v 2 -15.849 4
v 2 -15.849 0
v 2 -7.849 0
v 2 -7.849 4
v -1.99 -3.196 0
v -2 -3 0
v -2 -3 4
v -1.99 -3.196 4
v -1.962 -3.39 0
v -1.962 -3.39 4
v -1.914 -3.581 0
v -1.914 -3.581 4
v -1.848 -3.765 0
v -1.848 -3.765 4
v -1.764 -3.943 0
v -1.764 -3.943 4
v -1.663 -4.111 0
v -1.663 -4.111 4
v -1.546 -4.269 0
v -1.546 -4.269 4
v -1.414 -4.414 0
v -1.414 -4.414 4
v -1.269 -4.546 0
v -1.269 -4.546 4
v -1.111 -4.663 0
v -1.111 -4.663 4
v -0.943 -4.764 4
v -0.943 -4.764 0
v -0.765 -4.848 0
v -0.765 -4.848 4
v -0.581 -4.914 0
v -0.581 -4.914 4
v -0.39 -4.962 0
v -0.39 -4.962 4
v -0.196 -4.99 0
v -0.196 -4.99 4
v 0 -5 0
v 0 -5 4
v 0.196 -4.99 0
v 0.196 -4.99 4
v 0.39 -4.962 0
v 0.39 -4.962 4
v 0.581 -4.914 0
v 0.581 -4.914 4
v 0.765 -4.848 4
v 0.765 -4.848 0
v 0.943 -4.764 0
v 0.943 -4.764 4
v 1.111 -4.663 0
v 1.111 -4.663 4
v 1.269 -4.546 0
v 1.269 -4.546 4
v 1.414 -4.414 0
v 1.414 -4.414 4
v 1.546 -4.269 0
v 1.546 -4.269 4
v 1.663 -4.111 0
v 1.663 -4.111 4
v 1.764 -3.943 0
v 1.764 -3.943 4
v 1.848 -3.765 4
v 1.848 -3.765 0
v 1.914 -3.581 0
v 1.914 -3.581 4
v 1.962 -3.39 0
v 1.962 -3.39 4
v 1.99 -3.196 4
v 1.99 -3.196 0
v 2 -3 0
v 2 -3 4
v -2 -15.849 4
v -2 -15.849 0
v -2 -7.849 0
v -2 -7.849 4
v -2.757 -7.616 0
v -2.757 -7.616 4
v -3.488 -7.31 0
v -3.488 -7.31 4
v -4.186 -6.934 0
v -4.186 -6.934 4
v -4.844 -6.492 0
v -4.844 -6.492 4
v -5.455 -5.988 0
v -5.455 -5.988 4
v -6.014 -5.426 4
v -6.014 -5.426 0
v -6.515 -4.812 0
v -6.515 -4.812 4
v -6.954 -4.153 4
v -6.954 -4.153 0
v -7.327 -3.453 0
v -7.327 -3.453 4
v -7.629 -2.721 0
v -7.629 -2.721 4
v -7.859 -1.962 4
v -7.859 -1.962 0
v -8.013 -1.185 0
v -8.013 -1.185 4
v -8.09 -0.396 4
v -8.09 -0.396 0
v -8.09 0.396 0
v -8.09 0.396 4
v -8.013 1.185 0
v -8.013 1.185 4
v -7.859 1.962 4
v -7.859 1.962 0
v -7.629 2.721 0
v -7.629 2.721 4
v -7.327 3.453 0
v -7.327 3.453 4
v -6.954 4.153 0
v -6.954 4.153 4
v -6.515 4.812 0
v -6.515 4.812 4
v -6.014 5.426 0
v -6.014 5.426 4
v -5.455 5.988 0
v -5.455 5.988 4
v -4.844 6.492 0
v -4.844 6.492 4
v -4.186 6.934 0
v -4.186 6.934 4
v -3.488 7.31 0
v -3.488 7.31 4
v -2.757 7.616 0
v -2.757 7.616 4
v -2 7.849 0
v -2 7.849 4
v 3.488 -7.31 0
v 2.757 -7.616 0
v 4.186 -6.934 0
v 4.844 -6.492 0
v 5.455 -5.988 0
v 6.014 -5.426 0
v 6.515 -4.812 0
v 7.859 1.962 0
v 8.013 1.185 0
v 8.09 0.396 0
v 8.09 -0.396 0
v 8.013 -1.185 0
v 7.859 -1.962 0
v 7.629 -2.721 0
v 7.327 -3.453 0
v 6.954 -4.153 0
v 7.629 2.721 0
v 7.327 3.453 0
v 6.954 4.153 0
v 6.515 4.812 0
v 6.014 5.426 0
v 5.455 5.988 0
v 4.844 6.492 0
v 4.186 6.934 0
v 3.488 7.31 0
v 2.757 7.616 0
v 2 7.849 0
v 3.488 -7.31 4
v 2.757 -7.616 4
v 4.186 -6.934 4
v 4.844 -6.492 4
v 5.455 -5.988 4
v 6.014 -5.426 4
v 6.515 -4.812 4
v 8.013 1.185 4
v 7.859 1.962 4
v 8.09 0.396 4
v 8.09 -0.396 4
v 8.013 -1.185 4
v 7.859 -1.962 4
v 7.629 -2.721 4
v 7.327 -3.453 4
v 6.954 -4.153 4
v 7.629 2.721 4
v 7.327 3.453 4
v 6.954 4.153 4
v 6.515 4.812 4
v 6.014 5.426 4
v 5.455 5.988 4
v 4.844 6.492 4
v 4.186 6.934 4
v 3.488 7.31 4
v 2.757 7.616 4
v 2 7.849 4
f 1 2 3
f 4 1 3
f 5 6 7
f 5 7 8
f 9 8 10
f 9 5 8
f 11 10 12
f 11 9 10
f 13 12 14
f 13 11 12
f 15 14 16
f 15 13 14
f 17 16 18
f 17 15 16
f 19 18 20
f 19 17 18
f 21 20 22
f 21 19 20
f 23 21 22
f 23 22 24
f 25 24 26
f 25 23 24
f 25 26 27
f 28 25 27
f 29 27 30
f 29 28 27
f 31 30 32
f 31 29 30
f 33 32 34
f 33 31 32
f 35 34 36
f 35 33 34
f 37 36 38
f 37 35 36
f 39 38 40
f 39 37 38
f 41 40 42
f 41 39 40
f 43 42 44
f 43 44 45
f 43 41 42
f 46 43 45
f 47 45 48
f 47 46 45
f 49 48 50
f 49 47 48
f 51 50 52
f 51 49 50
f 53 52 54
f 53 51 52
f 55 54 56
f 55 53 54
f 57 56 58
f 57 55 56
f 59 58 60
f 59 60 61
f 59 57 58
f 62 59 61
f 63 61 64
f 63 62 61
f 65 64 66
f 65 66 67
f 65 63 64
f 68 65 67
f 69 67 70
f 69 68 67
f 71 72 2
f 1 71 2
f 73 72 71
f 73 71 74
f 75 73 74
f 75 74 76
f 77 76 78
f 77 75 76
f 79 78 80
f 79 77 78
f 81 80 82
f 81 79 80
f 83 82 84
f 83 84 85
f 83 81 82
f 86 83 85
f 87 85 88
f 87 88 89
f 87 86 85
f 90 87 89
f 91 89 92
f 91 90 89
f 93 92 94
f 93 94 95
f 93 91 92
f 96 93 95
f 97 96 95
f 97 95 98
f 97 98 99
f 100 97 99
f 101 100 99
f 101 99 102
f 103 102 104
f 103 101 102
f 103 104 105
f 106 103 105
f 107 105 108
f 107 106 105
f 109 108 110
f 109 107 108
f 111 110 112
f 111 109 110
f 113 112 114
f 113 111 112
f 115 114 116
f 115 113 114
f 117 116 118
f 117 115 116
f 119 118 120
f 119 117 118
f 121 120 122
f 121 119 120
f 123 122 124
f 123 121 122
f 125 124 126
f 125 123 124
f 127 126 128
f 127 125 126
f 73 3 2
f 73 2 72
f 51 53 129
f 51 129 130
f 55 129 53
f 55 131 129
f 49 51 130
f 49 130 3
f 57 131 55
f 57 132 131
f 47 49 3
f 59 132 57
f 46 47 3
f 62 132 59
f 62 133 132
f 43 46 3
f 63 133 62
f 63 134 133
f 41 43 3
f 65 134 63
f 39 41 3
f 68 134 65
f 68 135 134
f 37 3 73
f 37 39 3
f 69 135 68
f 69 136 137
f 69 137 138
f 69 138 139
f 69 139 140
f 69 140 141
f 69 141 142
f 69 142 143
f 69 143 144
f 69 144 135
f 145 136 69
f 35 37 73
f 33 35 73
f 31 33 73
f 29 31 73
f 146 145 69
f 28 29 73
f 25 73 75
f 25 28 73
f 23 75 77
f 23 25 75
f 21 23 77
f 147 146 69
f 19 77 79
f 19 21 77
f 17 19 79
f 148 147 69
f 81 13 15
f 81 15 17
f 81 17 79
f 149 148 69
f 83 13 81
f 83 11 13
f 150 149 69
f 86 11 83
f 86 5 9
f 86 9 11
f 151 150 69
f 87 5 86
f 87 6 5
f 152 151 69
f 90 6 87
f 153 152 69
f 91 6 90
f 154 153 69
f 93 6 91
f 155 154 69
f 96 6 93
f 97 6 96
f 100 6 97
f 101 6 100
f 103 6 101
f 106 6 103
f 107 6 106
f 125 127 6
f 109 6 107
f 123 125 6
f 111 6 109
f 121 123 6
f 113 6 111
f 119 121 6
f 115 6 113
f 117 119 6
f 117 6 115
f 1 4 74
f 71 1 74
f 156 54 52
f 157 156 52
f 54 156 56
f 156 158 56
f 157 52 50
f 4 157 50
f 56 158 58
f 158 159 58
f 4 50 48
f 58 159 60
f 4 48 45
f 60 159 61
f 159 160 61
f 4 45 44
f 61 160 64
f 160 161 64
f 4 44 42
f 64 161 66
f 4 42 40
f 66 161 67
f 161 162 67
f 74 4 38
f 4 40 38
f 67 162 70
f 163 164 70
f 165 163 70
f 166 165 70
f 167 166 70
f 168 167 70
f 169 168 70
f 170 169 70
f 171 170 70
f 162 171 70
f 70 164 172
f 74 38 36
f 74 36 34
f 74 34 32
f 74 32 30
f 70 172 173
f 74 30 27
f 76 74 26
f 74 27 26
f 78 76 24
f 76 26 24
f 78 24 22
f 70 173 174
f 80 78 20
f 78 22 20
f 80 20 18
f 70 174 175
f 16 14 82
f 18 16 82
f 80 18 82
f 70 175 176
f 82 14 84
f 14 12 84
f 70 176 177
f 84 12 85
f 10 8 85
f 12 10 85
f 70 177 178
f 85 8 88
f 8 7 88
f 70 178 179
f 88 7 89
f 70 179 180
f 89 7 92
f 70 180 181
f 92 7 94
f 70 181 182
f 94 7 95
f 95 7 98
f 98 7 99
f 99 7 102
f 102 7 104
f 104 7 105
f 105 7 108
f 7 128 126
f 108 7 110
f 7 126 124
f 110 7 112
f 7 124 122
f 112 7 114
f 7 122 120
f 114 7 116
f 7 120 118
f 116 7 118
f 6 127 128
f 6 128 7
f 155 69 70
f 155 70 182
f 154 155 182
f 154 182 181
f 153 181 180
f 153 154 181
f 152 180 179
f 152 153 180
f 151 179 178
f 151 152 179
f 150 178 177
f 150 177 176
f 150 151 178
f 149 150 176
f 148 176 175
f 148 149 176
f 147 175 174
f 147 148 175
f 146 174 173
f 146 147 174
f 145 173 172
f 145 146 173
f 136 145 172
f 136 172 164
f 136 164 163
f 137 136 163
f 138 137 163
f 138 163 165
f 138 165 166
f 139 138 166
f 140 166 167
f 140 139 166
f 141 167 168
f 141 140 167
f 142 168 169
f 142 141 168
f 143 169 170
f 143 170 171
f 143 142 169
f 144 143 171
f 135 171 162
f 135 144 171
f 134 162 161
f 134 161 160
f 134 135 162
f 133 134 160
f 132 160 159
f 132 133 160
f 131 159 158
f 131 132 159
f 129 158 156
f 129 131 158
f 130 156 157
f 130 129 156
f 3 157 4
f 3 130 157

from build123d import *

# Parameters (mm, degrees)
ESQUISSE1_W        = 4
ESQUISSE1_H        = 8
BOSS_EXTRU_1_DEPTH = 4


with BuildPart() as part:
    # Esquisse1 → Boss.-Extru.1 (new body)
    with BuildSketch(Plane.XY):
        with BuildLine():
            Line((-2, 7.849203781), (-2, -3))
            ThreePointArc((-2, -3), (0, -5), (2, -3))
            Line((2, -3), (2, 7.849203781))
            ThreePointArc((2, 7.849203781), (0, -8.1), (-2, 7.849203781))
        make_face()
        with Locations((0, -11.849203781)):
            Rectangle(ESQUISSE1_W, ESQUISSE1_H)
    extrude(amount=BOSS_EXTRU_1_DEPTH)


solid = part.part
